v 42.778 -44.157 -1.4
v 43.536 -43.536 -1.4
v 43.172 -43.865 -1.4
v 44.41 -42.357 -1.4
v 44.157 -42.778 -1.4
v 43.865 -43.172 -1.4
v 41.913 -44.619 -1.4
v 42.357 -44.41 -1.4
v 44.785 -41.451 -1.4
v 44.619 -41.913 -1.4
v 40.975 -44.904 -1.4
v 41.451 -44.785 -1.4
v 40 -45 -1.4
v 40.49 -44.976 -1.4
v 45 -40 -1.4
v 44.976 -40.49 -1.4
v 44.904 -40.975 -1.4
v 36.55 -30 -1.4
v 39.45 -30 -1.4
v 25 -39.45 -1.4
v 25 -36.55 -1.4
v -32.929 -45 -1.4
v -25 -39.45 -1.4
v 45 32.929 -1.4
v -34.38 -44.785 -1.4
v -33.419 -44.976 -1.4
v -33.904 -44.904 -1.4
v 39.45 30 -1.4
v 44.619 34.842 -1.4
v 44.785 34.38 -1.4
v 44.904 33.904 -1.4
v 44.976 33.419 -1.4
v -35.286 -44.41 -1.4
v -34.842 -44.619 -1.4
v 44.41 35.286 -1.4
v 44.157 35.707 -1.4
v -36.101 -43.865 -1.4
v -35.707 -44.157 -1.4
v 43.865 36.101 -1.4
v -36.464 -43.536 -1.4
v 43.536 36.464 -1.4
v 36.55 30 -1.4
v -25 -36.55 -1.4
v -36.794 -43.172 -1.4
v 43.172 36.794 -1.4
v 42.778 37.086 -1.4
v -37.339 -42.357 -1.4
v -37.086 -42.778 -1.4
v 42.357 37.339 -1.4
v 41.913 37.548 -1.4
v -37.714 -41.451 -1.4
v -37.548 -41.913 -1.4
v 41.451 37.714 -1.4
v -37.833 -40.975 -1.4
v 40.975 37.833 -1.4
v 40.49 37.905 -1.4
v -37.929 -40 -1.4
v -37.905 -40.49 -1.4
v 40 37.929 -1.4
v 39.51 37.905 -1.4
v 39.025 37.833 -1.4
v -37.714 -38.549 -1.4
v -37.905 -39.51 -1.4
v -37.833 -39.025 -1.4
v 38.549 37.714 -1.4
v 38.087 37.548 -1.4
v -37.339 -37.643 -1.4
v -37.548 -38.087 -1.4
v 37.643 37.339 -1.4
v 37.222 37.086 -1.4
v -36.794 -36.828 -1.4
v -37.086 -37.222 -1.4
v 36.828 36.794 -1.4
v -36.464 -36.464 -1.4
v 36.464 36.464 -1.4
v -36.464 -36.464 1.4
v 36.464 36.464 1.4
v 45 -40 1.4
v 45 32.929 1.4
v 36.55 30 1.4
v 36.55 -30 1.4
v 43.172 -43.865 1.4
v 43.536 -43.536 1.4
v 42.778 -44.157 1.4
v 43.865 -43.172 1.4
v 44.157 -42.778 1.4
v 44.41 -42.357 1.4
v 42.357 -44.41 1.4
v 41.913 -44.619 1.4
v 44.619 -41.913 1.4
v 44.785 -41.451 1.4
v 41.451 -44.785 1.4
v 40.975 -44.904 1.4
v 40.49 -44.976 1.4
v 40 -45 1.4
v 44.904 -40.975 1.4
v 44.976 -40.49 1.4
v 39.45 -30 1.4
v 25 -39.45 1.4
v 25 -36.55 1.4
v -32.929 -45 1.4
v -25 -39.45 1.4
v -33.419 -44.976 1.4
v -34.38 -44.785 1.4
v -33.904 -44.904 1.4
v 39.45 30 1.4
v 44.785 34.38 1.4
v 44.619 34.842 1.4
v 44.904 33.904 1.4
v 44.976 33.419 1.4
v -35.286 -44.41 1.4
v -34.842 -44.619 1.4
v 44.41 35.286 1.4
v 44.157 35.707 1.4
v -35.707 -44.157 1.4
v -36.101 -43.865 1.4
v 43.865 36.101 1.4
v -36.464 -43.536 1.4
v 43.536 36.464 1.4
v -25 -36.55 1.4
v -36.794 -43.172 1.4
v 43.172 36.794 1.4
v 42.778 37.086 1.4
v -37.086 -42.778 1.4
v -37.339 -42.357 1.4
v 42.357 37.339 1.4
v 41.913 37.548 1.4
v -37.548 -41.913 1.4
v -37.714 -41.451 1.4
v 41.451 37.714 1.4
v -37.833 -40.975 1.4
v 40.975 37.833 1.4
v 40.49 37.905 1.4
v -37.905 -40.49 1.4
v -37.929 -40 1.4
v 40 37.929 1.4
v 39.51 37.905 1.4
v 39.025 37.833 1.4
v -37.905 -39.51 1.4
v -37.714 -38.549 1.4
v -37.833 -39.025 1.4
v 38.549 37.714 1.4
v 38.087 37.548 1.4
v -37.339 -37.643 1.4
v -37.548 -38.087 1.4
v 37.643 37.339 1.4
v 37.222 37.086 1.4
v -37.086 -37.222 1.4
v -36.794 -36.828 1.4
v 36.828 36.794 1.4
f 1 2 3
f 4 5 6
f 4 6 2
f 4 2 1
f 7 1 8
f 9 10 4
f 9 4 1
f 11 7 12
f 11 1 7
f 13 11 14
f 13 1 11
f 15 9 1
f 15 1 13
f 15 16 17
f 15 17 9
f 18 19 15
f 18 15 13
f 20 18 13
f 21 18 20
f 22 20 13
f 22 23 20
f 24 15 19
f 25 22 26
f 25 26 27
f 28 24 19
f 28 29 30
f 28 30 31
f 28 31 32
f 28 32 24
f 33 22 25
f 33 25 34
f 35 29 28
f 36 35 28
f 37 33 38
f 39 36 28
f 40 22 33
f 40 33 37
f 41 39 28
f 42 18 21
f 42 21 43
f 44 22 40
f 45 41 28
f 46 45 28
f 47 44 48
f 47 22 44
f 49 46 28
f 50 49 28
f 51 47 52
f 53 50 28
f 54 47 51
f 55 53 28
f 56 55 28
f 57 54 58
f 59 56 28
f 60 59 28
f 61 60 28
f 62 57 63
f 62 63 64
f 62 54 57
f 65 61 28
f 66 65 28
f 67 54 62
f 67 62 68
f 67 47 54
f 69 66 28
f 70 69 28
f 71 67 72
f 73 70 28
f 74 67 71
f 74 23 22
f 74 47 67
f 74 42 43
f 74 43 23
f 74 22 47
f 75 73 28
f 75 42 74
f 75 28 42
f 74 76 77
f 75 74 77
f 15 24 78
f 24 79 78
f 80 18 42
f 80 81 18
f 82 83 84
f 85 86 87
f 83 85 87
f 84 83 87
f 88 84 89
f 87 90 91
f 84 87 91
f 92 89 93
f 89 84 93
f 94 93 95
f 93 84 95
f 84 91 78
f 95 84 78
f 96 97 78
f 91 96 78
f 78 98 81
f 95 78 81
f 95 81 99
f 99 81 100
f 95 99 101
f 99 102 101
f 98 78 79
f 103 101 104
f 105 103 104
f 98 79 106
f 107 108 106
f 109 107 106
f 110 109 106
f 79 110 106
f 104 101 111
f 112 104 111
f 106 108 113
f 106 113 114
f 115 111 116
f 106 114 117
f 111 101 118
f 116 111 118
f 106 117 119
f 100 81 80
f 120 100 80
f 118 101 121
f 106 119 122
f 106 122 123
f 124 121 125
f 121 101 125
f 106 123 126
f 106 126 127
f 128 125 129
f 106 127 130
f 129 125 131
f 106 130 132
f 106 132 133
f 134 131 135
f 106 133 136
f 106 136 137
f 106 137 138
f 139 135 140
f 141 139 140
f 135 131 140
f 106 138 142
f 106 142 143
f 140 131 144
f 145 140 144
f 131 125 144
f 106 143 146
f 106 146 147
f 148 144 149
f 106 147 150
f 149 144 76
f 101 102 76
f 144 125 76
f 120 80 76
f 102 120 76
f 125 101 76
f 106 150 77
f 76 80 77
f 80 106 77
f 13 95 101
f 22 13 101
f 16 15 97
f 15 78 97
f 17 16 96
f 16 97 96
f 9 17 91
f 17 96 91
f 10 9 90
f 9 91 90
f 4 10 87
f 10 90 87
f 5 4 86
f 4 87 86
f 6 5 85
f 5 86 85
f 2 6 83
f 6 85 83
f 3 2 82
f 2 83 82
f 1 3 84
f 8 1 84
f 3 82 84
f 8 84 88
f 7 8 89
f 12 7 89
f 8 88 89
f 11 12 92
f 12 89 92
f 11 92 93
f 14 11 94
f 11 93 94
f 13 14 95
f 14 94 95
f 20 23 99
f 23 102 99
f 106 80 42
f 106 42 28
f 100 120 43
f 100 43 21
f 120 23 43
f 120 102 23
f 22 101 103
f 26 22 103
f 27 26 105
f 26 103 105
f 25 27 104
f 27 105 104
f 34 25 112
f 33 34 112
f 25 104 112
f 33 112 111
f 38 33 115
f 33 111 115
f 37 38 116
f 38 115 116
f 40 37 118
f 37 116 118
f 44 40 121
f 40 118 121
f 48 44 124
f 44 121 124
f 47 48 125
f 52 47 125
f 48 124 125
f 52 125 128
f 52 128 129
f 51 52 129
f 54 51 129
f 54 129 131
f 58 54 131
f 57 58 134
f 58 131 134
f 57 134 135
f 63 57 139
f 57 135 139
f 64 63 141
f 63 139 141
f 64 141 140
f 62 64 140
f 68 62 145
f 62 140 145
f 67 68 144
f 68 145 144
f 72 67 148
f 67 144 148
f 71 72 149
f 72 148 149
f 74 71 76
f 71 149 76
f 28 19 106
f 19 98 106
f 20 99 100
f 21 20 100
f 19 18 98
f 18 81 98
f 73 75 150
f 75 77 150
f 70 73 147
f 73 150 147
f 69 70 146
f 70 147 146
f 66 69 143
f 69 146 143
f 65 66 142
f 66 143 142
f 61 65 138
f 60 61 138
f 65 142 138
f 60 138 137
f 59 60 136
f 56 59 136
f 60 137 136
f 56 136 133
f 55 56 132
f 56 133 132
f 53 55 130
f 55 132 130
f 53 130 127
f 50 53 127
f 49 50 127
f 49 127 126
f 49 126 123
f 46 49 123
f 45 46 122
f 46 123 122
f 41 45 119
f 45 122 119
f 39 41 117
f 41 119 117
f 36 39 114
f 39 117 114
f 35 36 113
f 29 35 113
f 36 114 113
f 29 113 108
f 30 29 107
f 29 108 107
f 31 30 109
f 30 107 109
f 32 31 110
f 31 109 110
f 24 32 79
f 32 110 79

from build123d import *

# Parameters (mm, degrees)
SKETCH_1_W      = 2.9
SKETCH_1_H      = 60
SKETCH_1_W_2    = 50
SKETCH_1_H_2    = 2.9
EXTRUDE_1_DEPTH = 1.4


with BuildPart() as part:
    # Эскиз1 → Бобышка-Вытянуть1 (new, symmetric)
    with BuildSketch(Plane.XY):
        with BuildLine():
            Line((-36.464466094, -36.464466094), (36.464466094, 36.464466094))
            ThreePointArc((36.464466094, 36.464466094), (41.913417162, 37.548329851), (45, 32.928932188))
            Line((45, 32.928932188), (45, -40))
            ThreePointArc((45, -40), (43.535533906, -43.535533906), (40, -45))
            Line((40, -45), (-32.928932188, -45))
            ThreePointArc((-32.928932188, -45), (-37.548329851, -41.913417162), (-36.464466094, -36.464466094))
        make_face()
        with Locations((38, 0)):
            Rectangle(SKETCH_1_W, SKETCH_1_H, mode=Mode.SUBTRACT)
        with Locations((0, -38)):
            Rectangle(SKETCH_1_W_2, SKETCH_1_H_2, mode=Mode.SUBTRACT)
    extrude(amount=EXTRUDE_1_DEPTH, both=True)


solid = part.part
